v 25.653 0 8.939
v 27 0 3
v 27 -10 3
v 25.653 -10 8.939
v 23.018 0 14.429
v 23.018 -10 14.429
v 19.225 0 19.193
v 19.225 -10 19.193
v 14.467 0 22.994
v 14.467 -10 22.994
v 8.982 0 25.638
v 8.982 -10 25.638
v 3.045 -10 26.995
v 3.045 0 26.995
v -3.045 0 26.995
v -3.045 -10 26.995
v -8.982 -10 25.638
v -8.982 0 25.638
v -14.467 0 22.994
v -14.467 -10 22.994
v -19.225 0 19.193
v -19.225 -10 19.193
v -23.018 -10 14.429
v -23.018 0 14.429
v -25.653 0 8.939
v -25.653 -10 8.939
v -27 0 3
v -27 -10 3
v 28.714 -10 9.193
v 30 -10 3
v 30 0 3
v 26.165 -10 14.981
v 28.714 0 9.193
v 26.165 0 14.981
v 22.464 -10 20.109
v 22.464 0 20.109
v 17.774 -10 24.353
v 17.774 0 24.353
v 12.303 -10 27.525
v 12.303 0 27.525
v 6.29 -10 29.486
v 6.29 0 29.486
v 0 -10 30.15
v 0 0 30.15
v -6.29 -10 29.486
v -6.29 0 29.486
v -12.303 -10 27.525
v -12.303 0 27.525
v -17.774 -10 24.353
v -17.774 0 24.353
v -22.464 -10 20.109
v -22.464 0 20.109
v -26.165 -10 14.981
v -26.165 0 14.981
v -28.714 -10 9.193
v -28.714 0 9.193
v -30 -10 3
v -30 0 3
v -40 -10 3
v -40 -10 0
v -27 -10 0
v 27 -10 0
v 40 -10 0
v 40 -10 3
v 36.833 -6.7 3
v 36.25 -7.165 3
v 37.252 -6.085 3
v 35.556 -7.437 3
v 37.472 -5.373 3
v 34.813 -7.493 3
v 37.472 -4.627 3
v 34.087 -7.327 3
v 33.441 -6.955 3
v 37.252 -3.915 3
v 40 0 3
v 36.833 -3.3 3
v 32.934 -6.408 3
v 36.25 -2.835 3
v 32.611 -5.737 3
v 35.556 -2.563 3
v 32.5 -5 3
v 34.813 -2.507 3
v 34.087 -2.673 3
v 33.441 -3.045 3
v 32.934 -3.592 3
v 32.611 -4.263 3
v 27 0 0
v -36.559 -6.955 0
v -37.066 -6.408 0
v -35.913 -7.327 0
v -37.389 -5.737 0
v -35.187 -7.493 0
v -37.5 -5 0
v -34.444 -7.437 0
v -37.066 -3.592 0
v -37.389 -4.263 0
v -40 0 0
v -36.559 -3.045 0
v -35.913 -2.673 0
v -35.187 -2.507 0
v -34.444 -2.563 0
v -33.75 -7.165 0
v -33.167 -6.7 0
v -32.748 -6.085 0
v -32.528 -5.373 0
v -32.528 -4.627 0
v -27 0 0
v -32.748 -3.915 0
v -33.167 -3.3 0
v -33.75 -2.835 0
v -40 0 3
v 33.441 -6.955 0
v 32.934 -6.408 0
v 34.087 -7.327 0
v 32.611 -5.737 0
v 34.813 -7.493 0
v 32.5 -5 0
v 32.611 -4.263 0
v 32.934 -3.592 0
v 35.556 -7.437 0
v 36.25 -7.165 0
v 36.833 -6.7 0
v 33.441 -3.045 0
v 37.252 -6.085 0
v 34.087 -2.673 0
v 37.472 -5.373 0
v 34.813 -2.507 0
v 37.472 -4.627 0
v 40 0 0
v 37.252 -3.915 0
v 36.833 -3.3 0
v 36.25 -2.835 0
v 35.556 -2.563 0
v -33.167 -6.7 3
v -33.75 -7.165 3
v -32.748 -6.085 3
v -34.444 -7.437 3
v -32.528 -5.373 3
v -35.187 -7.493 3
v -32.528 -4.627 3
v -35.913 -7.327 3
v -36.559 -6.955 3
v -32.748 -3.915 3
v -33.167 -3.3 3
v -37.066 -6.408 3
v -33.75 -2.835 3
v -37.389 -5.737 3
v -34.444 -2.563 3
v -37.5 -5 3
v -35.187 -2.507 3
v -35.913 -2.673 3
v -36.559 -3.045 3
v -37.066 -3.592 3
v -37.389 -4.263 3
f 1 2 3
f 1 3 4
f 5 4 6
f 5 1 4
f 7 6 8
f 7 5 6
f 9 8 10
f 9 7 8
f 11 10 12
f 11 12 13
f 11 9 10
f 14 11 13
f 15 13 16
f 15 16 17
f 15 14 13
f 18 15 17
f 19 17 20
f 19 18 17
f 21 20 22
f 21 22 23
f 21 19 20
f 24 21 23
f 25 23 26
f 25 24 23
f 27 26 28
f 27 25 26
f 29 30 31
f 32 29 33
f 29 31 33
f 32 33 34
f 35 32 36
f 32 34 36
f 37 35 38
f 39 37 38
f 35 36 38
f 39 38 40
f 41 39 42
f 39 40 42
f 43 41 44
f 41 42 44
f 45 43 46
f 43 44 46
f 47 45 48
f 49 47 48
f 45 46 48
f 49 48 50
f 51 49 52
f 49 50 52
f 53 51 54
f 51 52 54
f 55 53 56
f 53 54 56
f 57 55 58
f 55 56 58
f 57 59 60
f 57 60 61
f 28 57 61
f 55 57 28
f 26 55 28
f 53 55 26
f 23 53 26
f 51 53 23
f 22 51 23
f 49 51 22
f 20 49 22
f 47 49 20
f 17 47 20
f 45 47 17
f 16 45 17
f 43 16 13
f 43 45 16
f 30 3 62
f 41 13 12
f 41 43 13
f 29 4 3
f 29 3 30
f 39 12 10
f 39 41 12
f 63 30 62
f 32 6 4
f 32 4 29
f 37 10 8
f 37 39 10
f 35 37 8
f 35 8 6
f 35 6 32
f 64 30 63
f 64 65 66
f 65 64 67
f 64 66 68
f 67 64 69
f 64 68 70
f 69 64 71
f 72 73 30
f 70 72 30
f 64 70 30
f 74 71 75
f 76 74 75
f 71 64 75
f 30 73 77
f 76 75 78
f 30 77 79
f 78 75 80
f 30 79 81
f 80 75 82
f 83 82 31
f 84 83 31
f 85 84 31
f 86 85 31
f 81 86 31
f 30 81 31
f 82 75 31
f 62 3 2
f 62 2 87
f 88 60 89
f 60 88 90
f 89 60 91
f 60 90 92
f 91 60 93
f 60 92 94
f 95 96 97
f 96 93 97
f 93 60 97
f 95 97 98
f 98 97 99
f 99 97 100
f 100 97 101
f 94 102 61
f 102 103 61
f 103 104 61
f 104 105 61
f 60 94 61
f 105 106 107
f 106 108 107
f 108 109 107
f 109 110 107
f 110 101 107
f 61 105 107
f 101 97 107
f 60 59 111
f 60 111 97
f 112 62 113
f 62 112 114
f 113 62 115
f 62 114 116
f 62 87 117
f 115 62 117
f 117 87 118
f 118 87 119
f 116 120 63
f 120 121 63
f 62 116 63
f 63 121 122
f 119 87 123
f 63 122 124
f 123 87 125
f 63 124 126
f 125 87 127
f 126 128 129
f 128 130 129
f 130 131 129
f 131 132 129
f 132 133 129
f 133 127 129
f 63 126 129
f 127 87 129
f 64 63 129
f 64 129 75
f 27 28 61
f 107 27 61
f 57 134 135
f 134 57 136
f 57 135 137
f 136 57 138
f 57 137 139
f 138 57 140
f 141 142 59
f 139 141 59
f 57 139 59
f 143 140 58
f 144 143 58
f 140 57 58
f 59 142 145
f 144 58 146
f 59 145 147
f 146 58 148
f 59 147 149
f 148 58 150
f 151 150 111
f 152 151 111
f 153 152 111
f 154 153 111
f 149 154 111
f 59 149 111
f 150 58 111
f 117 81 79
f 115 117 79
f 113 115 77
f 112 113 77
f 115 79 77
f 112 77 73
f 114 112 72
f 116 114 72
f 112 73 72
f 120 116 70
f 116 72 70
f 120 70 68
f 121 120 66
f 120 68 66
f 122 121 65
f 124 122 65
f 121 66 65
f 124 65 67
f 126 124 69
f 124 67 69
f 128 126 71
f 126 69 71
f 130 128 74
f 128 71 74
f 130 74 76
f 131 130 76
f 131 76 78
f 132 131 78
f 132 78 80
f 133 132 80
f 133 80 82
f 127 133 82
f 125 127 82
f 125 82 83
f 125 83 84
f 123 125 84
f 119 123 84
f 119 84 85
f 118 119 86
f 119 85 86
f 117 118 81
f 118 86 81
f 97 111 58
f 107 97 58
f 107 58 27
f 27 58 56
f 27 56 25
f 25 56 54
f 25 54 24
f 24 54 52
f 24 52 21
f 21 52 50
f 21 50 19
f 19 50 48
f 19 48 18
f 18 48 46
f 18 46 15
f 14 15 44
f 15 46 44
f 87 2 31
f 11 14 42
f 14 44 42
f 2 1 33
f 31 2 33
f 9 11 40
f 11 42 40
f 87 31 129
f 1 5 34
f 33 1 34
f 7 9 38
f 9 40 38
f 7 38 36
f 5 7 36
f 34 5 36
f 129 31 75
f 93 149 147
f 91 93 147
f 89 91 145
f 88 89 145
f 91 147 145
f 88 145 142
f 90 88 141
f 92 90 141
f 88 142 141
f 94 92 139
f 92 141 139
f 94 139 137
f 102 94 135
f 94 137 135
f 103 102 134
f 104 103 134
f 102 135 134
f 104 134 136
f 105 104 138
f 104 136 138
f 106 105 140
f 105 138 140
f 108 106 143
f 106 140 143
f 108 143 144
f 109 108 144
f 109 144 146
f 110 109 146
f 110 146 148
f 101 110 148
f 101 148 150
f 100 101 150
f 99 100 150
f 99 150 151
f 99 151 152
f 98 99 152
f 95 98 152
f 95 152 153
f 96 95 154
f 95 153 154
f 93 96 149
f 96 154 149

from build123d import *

# Parameters (mm, degrees)
PAD_DEPTH    = 10
SKETCH001_R  = 2.5
POCKET_DEPTH = 3


with BuildPart() as part:
    # Sketch → Pad (new body)
    with BuildSketch(Plane.XZ):
        with BuildLine():
            ThreePointArc((30, 3), (0, 30.149627), (-30, 3))
            Line((-30, 3), (-40, 3))
            Line((-40, 3), (-40, 0))
            Line((-40, 0), (-27, 0))
            Line((-27, 3), (-27, 0))
            ThreePointArc((27, 3), (0, 27.166155), (-27, 3))
            Line((27, 3), (27, 0))
            Line((27, 0), (40, 0))
            Line((40, 0), (40, 3))
            Line((40, 3), (30, 3))
        make_face()
    extrude(amount=PAD_DEPTH)

    # Sketch001 (on Face6 of Pad) → Pocket (cut)
    with BuildSketch(Plane(origin=(0, 0, 3), x_dir=(-1, 0, 0), z_dir=(0, 0, 1))):
        with Locations((-35, 5)):
            Circle(SKETCH001_R)
        with Locations((35, 5)):
            Circle(SKETCH001_R)
    extrude(amount=-POCKET_DEPTH, mode=Mode.SUBTRACT)


solid = part.part
